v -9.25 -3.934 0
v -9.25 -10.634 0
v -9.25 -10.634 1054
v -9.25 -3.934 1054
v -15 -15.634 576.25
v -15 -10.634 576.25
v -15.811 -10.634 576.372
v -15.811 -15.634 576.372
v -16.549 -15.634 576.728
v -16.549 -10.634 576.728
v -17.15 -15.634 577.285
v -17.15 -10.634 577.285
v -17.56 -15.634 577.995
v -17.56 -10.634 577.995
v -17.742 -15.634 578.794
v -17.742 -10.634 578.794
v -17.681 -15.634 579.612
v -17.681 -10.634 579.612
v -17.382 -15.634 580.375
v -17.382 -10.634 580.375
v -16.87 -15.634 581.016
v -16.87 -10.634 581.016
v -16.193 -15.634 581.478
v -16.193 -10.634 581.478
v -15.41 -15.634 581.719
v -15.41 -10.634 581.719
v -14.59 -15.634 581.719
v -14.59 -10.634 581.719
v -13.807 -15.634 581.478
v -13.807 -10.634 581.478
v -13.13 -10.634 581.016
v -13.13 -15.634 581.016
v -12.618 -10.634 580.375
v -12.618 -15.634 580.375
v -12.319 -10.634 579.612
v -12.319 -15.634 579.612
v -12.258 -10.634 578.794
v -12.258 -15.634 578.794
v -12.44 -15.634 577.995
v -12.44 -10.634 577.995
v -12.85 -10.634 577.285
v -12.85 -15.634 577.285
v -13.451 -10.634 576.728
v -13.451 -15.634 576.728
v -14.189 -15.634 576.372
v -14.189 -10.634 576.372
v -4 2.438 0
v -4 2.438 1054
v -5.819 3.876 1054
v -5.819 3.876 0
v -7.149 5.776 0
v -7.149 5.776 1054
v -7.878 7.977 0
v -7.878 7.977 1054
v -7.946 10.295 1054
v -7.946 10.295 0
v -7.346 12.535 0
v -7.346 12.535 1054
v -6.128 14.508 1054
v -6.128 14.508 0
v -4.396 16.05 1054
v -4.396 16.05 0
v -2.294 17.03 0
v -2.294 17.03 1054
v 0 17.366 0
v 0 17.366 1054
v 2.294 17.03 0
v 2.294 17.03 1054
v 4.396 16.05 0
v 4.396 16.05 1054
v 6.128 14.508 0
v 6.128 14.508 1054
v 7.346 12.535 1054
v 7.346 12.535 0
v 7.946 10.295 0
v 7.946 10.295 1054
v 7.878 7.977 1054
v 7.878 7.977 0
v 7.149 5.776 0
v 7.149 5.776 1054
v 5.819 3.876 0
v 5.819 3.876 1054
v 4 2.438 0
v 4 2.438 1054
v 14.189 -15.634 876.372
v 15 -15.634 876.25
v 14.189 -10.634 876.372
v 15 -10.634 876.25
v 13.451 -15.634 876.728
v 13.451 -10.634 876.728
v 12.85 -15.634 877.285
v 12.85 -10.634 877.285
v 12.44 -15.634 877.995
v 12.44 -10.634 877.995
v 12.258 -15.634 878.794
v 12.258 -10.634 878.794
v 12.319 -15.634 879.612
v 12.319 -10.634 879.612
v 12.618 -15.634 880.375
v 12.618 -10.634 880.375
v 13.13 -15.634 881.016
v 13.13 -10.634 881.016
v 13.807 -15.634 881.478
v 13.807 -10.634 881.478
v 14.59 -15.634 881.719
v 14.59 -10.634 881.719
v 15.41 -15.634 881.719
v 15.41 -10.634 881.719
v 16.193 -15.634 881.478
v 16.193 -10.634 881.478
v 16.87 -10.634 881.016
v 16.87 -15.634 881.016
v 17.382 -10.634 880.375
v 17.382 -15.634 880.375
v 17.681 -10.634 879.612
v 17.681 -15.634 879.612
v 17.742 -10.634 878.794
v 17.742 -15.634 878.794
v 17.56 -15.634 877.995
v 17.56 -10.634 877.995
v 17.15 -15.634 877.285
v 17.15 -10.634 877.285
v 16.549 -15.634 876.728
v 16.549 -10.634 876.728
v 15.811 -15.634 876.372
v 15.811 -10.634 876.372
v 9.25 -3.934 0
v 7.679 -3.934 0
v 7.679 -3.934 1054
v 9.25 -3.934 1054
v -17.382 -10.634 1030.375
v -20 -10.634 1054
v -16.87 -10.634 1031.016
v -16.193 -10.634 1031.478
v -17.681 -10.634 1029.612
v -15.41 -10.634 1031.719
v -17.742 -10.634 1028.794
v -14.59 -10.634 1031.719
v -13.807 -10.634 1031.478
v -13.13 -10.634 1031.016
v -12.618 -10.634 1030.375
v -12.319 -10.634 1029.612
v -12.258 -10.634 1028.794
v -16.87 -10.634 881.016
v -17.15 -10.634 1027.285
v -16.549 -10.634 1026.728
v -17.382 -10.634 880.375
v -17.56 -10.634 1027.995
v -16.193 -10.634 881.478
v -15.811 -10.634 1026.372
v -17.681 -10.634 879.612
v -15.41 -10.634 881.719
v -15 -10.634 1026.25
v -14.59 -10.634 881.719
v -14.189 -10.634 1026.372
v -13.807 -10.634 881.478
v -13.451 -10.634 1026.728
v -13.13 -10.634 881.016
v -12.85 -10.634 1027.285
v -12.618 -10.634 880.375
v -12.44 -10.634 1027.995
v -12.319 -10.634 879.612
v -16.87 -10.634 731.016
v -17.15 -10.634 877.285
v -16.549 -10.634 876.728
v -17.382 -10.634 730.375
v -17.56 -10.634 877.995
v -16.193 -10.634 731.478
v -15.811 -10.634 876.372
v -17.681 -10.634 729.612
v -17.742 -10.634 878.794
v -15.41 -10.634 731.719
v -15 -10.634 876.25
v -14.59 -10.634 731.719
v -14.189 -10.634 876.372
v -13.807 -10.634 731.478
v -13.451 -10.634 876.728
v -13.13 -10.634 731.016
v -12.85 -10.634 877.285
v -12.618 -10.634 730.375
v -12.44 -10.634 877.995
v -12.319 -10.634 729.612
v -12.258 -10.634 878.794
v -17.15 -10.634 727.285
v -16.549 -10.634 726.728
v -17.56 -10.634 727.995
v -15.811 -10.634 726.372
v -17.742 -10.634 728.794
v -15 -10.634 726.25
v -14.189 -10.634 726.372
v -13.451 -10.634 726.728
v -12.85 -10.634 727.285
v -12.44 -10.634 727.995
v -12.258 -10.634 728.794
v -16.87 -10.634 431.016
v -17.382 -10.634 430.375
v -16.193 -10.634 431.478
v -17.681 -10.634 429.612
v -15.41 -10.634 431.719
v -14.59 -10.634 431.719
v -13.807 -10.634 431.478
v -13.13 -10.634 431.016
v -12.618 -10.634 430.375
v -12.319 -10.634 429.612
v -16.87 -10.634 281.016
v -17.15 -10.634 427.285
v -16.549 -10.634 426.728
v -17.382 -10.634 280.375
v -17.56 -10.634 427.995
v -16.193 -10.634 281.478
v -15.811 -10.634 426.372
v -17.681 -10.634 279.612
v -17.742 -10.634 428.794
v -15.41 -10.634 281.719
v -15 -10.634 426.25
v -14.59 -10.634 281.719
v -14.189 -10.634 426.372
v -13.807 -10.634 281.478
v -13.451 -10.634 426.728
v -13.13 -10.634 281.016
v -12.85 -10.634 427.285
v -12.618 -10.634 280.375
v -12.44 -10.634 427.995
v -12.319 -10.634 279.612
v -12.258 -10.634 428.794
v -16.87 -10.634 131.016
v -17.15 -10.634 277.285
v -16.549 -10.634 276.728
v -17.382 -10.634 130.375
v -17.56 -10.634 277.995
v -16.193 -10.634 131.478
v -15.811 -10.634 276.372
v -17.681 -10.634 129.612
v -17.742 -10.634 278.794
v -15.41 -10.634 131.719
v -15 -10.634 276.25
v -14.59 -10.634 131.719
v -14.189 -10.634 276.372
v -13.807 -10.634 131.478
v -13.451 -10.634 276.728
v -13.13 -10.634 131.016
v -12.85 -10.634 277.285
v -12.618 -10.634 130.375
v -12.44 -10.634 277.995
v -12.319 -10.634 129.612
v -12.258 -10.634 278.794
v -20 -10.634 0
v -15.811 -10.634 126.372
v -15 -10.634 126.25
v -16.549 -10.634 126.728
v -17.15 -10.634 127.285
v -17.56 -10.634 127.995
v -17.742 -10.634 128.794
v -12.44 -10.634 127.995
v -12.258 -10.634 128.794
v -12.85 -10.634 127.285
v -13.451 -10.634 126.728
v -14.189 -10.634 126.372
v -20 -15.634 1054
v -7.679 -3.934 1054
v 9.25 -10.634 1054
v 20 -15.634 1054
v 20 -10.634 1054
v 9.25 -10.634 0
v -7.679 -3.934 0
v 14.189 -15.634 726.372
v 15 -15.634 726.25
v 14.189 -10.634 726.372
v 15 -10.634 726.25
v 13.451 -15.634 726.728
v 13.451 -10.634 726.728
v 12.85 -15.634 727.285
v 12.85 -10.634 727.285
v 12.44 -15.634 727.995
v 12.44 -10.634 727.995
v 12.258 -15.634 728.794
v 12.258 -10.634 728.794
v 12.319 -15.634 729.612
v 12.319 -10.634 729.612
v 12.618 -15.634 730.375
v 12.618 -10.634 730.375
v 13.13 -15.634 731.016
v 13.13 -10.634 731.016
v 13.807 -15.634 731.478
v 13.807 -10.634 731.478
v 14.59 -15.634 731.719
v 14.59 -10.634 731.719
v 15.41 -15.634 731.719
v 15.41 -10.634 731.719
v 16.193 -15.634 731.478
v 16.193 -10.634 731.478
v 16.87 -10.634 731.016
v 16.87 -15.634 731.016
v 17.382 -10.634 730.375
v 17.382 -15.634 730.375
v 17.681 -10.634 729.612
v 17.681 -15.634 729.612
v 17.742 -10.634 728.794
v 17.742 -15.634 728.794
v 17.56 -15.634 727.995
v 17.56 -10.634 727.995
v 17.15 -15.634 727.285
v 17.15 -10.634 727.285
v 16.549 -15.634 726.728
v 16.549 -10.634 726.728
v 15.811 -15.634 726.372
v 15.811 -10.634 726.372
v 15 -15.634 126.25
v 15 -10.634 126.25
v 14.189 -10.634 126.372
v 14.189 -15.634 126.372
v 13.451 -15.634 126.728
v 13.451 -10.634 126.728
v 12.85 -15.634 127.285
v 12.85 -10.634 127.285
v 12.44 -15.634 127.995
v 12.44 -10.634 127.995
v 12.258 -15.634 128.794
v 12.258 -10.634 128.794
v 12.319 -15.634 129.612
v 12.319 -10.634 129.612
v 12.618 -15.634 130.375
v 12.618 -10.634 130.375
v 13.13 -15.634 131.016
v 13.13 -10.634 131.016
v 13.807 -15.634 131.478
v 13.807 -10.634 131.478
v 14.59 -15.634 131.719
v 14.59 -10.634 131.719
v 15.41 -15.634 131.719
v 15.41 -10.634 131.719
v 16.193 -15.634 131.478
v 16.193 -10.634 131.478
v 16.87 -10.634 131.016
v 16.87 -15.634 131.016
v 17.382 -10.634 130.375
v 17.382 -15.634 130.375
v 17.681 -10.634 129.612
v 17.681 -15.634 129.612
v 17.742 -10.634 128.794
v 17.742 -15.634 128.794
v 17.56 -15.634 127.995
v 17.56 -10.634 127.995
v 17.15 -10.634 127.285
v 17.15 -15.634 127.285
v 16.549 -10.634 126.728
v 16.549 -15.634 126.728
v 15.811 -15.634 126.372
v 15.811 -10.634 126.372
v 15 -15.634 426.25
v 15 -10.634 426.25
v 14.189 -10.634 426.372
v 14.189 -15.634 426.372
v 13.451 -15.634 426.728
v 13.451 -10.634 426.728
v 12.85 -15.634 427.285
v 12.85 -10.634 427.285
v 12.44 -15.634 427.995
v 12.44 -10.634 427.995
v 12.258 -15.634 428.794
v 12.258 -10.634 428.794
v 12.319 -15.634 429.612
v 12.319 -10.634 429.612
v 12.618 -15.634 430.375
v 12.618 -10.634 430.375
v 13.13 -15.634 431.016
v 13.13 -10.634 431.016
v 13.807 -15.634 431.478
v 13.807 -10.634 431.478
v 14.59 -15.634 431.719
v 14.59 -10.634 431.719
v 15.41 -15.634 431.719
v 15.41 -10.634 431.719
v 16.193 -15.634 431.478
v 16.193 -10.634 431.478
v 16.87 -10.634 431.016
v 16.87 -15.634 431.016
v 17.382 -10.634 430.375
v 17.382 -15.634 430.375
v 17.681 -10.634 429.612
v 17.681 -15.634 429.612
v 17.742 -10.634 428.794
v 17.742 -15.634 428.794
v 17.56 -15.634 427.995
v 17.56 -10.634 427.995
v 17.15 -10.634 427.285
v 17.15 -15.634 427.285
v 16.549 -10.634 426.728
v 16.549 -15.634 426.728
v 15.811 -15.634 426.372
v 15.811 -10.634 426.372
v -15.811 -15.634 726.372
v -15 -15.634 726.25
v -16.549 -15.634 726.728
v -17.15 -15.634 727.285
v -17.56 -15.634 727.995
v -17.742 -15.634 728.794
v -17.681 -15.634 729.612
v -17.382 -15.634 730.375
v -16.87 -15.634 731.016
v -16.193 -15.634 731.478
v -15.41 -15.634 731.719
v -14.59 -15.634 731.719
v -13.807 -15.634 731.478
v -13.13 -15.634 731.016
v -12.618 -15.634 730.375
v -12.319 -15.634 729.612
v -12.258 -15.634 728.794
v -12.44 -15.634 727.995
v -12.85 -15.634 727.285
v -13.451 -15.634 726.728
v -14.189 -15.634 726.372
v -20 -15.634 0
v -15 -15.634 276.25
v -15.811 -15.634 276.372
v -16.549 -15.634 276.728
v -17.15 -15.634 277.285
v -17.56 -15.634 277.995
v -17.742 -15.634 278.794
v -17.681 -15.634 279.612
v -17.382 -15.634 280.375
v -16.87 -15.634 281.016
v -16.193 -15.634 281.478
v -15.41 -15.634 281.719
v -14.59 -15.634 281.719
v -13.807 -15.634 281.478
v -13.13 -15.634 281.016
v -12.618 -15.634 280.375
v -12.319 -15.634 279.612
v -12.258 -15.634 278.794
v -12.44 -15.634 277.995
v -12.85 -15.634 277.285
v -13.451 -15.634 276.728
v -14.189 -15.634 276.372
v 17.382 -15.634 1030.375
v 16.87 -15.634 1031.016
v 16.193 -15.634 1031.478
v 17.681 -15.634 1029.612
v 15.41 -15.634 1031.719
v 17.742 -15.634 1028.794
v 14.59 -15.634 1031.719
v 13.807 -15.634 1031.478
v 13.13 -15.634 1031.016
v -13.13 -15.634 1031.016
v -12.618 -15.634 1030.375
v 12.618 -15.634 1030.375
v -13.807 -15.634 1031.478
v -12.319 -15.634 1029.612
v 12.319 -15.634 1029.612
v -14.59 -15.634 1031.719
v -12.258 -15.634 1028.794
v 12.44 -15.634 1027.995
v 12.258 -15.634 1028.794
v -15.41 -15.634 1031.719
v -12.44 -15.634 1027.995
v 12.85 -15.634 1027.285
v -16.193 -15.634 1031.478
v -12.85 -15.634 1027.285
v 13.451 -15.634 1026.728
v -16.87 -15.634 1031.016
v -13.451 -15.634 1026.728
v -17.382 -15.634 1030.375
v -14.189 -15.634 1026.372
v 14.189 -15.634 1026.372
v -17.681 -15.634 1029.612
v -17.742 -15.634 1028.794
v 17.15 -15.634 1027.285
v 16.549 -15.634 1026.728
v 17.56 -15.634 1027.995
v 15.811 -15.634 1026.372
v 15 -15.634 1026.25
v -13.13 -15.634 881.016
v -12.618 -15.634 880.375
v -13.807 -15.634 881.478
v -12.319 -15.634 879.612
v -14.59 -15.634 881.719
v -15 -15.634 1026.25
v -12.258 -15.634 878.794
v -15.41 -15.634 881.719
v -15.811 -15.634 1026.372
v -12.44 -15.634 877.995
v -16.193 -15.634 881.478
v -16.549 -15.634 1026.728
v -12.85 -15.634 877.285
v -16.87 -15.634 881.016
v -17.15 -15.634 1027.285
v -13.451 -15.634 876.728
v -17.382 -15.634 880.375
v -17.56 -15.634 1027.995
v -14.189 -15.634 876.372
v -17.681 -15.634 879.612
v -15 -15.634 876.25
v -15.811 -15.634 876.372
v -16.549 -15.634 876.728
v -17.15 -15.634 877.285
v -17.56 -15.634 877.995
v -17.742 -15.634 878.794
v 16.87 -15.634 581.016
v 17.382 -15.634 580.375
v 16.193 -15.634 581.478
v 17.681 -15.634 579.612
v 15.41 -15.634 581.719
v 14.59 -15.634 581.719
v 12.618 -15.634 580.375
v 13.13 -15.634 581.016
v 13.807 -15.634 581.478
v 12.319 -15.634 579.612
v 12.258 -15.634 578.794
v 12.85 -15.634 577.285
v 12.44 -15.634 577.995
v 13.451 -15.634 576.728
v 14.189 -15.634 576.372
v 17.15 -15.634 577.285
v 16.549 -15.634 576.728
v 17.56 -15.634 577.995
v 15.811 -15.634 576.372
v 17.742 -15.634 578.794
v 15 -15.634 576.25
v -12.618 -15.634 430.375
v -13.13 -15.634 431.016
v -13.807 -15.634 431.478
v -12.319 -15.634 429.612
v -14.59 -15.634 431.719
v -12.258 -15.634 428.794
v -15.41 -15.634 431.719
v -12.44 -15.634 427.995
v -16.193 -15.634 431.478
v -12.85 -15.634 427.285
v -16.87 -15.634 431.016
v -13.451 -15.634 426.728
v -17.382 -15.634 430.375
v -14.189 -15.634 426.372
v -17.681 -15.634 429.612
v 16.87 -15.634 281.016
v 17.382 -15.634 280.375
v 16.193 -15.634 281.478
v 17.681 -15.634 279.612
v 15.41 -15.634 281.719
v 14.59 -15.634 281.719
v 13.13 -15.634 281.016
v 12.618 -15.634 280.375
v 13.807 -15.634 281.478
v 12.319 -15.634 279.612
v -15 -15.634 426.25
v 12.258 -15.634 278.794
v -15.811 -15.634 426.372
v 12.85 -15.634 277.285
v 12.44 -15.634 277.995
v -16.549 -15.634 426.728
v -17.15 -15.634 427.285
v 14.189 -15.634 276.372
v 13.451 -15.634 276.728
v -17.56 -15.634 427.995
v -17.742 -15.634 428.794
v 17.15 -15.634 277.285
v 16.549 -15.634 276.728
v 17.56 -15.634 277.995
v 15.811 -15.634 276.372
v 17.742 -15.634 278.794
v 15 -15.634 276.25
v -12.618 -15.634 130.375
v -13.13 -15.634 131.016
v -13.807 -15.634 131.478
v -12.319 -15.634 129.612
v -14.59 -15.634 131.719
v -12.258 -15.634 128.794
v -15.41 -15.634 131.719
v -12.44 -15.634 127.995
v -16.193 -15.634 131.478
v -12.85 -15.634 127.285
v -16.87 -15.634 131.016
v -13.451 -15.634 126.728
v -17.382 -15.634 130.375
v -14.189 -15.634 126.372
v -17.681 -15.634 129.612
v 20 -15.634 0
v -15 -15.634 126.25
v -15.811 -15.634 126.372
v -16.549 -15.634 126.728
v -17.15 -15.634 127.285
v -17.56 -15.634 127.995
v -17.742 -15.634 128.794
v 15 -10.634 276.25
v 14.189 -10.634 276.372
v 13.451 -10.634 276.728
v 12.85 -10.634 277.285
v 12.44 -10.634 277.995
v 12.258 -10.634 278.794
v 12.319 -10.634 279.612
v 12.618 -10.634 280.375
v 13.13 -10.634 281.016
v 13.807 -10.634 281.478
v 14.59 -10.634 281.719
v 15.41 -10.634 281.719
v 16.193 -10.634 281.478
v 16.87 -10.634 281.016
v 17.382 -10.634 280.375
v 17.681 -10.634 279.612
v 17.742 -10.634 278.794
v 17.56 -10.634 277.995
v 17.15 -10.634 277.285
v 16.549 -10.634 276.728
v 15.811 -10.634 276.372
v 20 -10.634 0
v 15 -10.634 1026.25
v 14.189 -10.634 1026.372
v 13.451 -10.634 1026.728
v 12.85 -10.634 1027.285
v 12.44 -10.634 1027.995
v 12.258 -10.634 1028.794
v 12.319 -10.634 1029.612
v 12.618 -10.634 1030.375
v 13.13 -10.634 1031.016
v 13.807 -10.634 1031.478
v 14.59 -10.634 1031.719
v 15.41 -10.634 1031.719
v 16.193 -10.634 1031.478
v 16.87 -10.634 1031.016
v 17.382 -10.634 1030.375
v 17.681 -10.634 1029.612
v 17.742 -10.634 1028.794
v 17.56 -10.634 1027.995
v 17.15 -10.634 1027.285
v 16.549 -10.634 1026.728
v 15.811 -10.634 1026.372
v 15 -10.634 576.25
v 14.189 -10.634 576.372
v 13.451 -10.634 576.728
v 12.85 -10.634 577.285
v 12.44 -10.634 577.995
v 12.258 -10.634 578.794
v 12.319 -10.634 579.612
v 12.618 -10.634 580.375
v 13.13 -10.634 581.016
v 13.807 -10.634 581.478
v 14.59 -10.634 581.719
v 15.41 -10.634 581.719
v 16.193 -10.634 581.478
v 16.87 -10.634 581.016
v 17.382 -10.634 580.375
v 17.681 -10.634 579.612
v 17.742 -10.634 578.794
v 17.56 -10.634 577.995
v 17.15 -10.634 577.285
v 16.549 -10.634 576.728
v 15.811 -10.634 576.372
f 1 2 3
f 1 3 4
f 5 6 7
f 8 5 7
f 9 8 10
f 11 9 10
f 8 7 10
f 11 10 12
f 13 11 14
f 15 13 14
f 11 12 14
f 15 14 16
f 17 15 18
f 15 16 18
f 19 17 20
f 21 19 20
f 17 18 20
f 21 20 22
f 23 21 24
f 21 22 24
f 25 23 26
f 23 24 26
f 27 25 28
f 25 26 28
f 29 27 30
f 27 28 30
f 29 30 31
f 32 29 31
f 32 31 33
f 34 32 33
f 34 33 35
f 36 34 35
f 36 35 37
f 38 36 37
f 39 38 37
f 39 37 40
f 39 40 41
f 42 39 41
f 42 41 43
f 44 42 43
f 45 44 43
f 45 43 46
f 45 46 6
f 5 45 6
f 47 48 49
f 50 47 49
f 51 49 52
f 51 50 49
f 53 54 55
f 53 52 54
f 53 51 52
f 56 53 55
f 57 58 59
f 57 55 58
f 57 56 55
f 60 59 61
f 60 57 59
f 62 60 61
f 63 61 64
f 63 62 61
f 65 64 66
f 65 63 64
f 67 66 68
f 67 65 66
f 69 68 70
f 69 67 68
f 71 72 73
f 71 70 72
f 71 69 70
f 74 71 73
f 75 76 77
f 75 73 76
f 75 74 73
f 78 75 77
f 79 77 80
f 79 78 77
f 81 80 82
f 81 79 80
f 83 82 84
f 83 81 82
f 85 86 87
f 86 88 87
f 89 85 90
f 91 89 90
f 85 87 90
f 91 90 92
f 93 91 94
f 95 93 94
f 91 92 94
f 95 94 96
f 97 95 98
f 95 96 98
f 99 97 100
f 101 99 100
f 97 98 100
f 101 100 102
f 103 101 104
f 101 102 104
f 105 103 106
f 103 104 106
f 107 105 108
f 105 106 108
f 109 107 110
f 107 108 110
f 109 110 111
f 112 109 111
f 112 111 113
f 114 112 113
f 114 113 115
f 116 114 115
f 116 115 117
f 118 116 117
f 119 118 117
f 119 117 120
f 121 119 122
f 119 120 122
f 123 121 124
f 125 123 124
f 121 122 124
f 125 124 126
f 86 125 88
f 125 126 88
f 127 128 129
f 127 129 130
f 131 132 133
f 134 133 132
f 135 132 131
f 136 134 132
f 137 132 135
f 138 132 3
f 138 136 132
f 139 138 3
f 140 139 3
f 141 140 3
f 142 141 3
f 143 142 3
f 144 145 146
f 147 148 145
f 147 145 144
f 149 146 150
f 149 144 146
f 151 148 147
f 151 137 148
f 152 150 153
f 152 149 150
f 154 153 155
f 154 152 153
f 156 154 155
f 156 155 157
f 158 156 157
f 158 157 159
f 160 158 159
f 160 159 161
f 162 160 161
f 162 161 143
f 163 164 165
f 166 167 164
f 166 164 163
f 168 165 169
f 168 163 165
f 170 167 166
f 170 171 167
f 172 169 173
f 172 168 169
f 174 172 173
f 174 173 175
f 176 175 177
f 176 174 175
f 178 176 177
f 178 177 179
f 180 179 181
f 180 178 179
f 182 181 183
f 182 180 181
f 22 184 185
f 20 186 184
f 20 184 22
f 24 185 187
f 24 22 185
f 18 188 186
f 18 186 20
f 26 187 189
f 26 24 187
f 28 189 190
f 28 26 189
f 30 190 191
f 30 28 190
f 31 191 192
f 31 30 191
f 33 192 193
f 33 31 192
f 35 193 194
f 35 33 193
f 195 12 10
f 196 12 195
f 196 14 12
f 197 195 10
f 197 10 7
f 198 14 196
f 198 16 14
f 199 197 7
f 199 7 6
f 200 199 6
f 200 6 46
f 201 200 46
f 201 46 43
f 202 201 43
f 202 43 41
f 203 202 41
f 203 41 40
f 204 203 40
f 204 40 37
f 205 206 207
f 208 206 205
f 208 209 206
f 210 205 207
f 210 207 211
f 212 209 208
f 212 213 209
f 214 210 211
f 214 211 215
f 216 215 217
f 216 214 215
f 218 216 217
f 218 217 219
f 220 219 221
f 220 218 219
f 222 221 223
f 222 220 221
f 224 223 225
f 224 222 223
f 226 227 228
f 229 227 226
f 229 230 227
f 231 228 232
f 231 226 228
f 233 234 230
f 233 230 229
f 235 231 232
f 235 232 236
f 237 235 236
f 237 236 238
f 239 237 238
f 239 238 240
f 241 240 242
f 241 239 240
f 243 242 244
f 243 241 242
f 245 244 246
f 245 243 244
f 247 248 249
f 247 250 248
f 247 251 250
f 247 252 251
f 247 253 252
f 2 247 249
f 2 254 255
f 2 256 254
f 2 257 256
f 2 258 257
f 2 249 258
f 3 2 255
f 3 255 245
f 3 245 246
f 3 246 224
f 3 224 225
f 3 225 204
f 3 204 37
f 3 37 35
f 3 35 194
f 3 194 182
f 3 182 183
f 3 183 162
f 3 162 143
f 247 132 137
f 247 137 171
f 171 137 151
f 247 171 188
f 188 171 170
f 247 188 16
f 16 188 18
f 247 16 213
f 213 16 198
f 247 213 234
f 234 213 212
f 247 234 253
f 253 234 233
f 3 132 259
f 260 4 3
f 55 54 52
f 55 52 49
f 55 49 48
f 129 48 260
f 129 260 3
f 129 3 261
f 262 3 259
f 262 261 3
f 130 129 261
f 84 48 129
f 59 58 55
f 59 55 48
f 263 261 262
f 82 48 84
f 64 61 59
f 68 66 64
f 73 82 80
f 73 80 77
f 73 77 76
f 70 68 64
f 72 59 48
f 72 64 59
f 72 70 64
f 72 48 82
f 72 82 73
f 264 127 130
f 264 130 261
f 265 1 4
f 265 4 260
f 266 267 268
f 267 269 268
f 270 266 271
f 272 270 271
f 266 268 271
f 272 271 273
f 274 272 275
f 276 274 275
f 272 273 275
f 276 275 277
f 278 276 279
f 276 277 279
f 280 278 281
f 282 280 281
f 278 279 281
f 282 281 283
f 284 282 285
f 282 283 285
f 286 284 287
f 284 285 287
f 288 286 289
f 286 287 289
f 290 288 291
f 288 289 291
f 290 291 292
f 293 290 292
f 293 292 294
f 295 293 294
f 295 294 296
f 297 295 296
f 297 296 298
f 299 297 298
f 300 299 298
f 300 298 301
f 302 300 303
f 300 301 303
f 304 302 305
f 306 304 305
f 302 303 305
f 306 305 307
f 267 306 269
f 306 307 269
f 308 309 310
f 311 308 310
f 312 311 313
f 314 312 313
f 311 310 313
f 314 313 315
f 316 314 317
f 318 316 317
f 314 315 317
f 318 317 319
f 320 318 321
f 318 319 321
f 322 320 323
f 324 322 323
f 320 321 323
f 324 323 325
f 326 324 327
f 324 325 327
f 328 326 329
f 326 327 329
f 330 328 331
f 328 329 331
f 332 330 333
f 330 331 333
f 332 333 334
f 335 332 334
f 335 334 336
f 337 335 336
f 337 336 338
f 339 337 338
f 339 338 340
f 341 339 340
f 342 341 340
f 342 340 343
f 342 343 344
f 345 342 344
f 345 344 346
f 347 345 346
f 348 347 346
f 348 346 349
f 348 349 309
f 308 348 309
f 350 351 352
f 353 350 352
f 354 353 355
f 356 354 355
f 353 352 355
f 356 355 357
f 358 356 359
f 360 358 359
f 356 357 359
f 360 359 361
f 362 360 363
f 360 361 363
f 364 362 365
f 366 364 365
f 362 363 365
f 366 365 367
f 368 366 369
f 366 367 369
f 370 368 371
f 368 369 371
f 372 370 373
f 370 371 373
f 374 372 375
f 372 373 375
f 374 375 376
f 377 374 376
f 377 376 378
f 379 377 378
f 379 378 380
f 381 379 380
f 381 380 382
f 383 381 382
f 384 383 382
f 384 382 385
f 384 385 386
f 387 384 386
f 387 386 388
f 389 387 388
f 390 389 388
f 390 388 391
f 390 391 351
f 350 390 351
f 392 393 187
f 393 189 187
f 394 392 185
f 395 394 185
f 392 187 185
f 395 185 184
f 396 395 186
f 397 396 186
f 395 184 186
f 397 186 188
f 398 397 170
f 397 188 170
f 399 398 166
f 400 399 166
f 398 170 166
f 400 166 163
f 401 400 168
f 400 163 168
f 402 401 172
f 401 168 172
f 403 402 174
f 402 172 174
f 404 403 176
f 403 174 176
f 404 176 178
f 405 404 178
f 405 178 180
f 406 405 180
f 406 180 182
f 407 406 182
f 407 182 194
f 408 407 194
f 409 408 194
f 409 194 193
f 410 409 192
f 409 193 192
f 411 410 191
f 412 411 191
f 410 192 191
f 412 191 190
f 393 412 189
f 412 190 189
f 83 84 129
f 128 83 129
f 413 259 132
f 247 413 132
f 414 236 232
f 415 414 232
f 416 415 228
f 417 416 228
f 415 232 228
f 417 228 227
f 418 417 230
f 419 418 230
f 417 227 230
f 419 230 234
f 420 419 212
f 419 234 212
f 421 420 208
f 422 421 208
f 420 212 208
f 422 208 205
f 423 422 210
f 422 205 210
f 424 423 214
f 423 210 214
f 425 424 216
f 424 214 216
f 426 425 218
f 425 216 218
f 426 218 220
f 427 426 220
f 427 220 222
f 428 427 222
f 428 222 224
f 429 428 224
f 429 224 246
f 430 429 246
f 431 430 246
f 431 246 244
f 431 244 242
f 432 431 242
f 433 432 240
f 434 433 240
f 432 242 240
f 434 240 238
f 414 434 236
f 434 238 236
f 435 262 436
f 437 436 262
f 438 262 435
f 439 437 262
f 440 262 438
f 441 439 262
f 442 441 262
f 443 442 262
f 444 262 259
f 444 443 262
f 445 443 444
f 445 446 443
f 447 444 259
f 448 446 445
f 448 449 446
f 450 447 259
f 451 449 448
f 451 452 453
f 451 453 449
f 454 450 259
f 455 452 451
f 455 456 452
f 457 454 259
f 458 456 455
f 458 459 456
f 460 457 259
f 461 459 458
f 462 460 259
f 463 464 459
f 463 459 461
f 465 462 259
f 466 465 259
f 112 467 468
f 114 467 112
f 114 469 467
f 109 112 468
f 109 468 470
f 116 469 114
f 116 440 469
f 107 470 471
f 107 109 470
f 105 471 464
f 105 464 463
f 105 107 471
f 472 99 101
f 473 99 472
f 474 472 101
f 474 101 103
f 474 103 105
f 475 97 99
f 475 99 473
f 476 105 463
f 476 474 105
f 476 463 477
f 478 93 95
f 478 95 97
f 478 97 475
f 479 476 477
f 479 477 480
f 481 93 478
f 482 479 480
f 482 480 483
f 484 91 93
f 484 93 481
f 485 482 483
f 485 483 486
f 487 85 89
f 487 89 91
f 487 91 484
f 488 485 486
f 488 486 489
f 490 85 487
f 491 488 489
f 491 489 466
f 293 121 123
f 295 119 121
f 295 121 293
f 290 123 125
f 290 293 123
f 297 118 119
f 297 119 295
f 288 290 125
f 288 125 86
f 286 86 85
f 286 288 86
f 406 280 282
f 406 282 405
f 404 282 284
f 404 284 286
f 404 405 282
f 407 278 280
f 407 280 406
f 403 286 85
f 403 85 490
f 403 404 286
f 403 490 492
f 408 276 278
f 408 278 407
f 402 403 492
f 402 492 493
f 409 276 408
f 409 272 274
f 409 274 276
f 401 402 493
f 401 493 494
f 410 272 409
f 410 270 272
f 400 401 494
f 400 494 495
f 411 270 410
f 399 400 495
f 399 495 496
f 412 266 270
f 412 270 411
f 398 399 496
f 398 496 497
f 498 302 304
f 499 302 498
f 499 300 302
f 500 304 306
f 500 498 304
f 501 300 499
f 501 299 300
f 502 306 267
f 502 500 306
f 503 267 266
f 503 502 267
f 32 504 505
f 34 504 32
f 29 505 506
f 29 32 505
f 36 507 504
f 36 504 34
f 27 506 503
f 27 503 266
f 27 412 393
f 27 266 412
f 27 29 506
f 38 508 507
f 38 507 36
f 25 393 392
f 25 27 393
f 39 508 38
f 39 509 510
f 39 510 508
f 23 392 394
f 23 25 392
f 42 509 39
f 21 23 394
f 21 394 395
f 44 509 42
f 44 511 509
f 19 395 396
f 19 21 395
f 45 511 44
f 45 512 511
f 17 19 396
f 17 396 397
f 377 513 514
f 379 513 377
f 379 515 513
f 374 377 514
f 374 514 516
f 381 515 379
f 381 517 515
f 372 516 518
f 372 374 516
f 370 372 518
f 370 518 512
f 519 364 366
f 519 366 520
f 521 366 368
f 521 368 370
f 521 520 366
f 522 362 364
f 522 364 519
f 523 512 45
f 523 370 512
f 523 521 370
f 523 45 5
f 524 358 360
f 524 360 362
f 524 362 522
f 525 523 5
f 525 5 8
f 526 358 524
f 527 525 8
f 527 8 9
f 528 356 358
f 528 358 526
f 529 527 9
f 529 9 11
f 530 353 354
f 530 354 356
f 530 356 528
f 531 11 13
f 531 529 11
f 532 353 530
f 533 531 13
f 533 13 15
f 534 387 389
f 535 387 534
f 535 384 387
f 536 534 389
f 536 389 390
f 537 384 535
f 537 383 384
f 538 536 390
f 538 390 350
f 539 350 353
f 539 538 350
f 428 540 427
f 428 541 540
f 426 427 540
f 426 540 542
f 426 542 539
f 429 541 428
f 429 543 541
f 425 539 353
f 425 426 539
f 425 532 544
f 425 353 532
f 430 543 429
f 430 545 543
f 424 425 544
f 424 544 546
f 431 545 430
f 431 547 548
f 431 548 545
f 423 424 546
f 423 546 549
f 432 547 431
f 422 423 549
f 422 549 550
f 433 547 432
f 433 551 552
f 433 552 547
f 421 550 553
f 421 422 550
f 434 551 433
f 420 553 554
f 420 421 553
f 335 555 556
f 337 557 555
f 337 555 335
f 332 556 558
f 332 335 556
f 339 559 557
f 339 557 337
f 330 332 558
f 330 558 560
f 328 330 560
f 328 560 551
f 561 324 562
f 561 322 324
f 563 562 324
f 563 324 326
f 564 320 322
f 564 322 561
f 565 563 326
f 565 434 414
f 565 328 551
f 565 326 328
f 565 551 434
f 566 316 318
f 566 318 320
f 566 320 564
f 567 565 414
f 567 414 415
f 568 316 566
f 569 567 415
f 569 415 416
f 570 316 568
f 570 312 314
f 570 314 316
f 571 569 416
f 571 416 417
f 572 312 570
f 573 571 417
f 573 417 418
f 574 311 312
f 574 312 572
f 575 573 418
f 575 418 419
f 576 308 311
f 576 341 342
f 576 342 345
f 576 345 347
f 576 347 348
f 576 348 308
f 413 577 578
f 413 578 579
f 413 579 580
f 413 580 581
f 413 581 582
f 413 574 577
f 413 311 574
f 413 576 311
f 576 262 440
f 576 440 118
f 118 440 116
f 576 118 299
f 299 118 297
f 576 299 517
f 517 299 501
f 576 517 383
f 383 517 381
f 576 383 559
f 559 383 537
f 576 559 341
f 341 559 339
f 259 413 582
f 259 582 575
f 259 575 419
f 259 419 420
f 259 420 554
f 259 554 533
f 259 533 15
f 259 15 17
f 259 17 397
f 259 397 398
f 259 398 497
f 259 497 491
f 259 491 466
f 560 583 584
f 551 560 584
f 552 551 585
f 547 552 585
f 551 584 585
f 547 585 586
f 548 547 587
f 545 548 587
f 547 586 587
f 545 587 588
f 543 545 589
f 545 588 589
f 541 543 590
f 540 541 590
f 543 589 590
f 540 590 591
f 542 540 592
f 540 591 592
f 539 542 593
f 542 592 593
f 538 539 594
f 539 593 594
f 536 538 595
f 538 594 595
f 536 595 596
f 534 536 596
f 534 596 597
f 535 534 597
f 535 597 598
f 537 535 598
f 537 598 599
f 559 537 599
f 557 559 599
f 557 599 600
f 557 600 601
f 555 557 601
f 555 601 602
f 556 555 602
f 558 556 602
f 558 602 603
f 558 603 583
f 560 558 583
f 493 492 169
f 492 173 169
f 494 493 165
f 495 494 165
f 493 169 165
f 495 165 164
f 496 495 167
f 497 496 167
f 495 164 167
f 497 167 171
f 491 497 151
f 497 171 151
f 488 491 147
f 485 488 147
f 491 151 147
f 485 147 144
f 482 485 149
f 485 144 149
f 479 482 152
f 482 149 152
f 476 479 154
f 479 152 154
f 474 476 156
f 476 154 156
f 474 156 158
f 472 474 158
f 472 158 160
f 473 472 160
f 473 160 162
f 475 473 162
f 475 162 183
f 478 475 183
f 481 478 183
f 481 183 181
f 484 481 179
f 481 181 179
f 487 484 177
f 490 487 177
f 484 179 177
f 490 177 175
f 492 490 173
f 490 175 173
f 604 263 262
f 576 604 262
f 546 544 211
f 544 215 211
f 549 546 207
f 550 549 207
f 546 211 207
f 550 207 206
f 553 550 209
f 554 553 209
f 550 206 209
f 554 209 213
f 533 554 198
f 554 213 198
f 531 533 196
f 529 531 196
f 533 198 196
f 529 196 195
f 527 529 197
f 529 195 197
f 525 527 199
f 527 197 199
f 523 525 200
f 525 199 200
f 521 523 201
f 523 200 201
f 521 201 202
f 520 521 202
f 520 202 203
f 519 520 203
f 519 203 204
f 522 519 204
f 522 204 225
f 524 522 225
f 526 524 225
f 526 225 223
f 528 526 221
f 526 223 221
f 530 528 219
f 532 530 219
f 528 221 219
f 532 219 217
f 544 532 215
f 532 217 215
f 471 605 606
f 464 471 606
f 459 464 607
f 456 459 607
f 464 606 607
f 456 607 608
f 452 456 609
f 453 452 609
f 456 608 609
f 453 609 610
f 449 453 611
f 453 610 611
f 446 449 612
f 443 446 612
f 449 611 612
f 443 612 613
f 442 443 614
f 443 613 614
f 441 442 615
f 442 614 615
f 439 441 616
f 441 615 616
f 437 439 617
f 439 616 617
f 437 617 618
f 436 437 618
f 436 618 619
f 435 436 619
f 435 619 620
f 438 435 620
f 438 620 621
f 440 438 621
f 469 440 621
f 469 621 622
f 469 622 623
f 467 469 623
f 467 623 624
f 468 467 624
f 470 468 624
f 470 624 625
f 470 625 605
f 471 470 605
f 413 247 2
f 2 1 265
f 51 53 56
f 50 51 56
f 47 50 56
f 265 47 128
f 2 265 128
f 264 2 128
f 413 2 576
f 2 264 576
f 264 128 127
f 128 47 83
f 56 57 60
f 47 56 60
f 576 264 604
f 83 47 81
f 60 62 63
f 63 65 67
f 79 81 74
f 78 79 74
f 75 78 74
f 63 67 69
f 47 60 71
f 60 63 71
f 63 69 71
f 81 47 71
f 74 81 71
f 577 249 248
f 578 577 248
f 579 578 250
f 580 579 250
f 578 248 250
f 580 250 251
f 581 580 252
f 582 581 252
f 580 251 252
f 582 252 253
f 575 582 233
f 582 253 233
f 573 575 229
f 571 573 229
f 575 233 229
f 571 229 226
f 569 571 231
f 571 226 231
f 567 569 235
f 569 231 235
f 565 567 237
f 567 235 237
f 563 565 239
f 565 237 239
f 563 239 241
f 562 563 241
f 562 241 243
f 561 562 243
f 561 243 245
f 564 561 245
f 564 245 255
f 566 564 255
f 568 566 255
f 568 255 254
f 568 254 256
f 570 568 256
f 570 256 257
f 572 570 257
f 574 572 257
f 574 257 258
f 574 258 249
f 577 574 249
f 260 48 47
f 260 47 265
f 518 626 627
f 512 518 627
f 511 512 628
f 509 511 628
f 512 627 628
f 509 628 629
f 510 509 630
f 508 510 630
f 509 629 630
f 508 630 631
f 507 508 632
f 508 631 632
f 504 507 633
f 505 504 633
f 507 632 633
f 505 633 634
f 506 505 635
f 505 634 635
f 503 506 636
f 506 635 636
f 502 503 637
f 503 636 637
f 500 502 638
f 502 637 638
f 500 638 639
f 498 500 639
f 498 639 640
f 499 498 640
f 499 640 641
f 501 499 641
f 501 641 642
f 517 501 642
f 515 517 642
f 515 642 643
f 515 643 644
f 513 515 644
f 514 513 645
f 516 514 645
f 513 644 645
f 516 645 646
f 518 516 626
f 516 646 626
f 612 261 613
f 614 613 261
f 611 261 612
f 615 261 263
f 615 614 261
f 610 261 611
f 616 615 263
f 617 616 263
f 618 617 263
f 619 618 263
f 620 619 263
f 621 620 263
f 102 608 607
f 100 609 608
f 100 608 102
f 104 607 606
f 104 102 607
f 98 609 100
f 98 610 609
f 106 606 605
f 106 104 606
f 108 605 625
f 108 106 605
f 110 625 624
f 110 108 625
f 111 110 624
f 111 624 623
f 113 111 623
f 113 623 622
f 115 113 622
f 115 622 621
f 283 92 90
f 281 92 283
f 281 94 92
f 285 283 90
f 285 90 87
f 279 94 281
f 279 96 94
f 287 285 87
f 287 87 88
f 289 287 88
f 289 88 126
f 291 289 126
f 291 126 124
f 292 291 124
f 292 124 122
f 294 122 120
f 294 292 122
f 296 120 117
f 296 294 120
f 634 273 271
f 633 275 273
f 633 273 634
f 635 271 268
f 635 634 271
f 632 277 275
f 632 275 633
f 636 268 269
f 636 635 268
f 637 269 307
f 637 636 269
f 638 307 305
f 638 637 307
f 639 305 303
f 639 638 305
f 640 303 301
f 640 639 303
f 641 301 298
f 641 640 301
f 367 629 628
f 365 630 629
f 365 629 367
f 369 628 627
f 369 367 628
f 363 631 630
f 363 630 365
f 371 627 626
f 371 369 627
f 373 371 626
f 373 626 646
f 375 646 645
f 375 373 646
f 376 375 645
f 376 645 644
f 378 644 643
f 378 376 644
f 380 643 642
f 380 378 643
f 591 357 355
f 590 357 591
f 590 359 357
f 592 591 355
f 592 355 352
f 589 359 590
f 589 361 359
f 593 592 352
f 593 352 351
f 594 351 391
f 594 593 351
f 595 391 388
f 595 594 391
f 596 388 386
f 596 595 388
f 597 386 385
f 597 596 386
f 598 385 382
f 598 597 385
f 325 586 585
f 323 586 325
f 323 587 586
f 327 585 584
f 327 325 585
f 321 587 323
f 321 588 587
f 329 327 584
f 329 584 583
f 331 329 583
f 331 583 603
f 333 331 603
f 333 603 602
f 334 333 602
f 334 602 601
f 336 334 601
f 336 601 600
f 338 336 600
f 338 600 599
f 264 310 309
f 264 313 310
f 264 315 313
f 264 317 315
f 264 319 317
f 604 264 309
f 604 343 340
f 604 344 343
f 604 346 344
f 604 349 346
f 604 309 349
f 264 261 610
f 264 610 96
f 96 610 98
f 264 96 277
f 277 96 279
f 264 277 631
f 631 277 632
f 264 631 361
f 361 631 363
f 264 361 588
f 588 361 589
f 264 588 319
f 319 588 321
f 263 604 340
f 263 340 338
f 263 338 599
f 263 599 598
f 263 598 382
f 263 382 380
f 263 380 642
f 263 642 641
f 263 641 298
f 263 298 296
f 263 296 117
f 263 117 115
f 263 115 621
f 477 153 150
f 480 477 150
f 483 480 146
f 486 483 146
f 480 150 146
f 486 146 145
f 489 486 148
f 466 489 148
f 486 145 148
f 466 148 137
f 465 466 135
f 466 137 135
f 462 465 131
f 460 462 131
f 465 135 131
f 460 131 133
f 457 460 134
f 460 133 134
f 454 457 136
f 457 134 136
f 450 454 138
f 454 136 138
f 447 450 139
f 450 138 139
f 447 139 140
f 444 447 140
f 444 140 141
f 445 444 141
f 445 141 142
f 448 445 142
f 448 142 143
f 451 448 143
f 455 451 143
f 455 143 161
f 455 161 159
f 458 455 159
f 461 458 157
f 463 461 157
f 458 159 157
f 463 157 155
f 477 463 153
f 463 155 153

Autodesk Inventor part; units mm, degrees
ref_plane "YZ Plane" through (0, 0, 0) normal (1, 0, 0) x (0, 1, 0)
ref_plane "XZ Plane" through (0, 0, 0) normal (0, 1, 0) x (-1, 0, 0)
ref_plane "XY Plane" through (0, 0, 0) normal (0, 0, 1) x (1, 0, 0)
sketch "Esboço1" plane through (0, 0, 0) normal (0, 0, 1) x (1, 0, 0)
  arc A0 (4, 2.4377) -> (-4, 2.4377) centre (0, 9.3659) ccw
  line L0 (9.25, -3.9341) -> (9.25, -10.6341)
  line L1 (-9.25, -10.6341) -> (-9.25, -3.9341)
  line L2 (4, -15.6341) -> (-4, -15.6341)
  line L3 (20, -15.6341) -> (-20, -15.6341)
  line L4 (-20, -15.6341) -> (-20, -10.6341)
  line L5 (20, -10.6341) -> (20, -15.6341)
  line L6 (7.6788, -3.9341) -> (9.25, -3.9341)
  line L7 (-9.25, -3.9341) -> (-7.6788, -3.9341)
  line L8 (9.25, -10.6341) -> (20, -10.6341)
  line L9 (-20, -10.6341) -> (-9.25, -10.6341)
  line L10 (-4, 2.4377) -> (-7.6788, -3.9341)
  line L11 (-17.4151, -20.798) -> (-22.4188, -29.4646)
  line L12 (17.4151, -20.798) -> (23.6527, -31.6017)
  line L13 (9.25, -15.6341) -> (4, -15.6341)
  line L14 (0, -15.6341) -> (-9.25, -15.6341)
  line L15 (4, 2.4377) -> (7.6788, -3.9341)
  dimension "d6" = 16
  dimension "d7" = 25
  dimension "d8" = 18.5
  dimension "d9" = 11.7
  dimension "d10" = 8
  dimension "d13" = 5
  dimension "d14" = 40
extrude "Extrusão1" add sketch "Esboço1" along normal blind 1054
sketch "Esboço3" plane through (-20, -15.6341, 0) normal (0, -1, 0) x (1, 0, 0)
  line L0 (0, 1054) -> (40, 1054) construction
  line L1 (20, 1054) -> (20, 0) construction
  line L2 (20, 1029) -> (5, 1029) construction
  line L3 (5, 1029) -> (20, 1029) construction
  line L4 (20, 1029) -> (35, 1029) construction
  circle A0 centre (5, 1029) radius 2.75
  circle A1 centre (35, 1029) radius 2.75
  line L5 (40, 0) -> (0, 0) construction
  line L6 (35, 1054) -> (35, 0) construction
  line L7 (5, 1054) -> (5, 0) construction
  point P0 (5, 879)
  point P1 (35, 879)
  point P2 (5, 729)
  point P3 (35, 729)
  point P4 (5, 579)
  point P5 (35, 579)
  point P6 (5, 429)
  point P7 (35, 429)
  point P8 (5, 279)
  point P9 (35, 279)
  point P10 (5, 129)
  point P11 (35, 129)
  dimension "d18" = 15
  dimension "d19" = 15
  dimension "d20" = 5.5
  dimension "d21" = 5.5
  dimension "d22" = 25
  dimension "d39" = 150
hole "Furo2" at (-15, -15.6341, 279) at (15, -15.6341, 279) at (15, -15.6341, 129) at (-15, -15.6341, 129) at (15, -15.6341, 429) at (-15, -15.6341, 429) at (15, -15.6341, 579) at (-15, -15.6341, 579) at (15, -15.6341, 729) at (-15, -15.6341, 729) at (-15, -15.6341, 879) at (15, -15.6341, 879) at (15, -15.6341, 1029) at (-15, -15.6341, 1029) direction (0, 1, 0) diameter 5.5 end through all
properties part number "SBR16_EIXO_Y_1"
